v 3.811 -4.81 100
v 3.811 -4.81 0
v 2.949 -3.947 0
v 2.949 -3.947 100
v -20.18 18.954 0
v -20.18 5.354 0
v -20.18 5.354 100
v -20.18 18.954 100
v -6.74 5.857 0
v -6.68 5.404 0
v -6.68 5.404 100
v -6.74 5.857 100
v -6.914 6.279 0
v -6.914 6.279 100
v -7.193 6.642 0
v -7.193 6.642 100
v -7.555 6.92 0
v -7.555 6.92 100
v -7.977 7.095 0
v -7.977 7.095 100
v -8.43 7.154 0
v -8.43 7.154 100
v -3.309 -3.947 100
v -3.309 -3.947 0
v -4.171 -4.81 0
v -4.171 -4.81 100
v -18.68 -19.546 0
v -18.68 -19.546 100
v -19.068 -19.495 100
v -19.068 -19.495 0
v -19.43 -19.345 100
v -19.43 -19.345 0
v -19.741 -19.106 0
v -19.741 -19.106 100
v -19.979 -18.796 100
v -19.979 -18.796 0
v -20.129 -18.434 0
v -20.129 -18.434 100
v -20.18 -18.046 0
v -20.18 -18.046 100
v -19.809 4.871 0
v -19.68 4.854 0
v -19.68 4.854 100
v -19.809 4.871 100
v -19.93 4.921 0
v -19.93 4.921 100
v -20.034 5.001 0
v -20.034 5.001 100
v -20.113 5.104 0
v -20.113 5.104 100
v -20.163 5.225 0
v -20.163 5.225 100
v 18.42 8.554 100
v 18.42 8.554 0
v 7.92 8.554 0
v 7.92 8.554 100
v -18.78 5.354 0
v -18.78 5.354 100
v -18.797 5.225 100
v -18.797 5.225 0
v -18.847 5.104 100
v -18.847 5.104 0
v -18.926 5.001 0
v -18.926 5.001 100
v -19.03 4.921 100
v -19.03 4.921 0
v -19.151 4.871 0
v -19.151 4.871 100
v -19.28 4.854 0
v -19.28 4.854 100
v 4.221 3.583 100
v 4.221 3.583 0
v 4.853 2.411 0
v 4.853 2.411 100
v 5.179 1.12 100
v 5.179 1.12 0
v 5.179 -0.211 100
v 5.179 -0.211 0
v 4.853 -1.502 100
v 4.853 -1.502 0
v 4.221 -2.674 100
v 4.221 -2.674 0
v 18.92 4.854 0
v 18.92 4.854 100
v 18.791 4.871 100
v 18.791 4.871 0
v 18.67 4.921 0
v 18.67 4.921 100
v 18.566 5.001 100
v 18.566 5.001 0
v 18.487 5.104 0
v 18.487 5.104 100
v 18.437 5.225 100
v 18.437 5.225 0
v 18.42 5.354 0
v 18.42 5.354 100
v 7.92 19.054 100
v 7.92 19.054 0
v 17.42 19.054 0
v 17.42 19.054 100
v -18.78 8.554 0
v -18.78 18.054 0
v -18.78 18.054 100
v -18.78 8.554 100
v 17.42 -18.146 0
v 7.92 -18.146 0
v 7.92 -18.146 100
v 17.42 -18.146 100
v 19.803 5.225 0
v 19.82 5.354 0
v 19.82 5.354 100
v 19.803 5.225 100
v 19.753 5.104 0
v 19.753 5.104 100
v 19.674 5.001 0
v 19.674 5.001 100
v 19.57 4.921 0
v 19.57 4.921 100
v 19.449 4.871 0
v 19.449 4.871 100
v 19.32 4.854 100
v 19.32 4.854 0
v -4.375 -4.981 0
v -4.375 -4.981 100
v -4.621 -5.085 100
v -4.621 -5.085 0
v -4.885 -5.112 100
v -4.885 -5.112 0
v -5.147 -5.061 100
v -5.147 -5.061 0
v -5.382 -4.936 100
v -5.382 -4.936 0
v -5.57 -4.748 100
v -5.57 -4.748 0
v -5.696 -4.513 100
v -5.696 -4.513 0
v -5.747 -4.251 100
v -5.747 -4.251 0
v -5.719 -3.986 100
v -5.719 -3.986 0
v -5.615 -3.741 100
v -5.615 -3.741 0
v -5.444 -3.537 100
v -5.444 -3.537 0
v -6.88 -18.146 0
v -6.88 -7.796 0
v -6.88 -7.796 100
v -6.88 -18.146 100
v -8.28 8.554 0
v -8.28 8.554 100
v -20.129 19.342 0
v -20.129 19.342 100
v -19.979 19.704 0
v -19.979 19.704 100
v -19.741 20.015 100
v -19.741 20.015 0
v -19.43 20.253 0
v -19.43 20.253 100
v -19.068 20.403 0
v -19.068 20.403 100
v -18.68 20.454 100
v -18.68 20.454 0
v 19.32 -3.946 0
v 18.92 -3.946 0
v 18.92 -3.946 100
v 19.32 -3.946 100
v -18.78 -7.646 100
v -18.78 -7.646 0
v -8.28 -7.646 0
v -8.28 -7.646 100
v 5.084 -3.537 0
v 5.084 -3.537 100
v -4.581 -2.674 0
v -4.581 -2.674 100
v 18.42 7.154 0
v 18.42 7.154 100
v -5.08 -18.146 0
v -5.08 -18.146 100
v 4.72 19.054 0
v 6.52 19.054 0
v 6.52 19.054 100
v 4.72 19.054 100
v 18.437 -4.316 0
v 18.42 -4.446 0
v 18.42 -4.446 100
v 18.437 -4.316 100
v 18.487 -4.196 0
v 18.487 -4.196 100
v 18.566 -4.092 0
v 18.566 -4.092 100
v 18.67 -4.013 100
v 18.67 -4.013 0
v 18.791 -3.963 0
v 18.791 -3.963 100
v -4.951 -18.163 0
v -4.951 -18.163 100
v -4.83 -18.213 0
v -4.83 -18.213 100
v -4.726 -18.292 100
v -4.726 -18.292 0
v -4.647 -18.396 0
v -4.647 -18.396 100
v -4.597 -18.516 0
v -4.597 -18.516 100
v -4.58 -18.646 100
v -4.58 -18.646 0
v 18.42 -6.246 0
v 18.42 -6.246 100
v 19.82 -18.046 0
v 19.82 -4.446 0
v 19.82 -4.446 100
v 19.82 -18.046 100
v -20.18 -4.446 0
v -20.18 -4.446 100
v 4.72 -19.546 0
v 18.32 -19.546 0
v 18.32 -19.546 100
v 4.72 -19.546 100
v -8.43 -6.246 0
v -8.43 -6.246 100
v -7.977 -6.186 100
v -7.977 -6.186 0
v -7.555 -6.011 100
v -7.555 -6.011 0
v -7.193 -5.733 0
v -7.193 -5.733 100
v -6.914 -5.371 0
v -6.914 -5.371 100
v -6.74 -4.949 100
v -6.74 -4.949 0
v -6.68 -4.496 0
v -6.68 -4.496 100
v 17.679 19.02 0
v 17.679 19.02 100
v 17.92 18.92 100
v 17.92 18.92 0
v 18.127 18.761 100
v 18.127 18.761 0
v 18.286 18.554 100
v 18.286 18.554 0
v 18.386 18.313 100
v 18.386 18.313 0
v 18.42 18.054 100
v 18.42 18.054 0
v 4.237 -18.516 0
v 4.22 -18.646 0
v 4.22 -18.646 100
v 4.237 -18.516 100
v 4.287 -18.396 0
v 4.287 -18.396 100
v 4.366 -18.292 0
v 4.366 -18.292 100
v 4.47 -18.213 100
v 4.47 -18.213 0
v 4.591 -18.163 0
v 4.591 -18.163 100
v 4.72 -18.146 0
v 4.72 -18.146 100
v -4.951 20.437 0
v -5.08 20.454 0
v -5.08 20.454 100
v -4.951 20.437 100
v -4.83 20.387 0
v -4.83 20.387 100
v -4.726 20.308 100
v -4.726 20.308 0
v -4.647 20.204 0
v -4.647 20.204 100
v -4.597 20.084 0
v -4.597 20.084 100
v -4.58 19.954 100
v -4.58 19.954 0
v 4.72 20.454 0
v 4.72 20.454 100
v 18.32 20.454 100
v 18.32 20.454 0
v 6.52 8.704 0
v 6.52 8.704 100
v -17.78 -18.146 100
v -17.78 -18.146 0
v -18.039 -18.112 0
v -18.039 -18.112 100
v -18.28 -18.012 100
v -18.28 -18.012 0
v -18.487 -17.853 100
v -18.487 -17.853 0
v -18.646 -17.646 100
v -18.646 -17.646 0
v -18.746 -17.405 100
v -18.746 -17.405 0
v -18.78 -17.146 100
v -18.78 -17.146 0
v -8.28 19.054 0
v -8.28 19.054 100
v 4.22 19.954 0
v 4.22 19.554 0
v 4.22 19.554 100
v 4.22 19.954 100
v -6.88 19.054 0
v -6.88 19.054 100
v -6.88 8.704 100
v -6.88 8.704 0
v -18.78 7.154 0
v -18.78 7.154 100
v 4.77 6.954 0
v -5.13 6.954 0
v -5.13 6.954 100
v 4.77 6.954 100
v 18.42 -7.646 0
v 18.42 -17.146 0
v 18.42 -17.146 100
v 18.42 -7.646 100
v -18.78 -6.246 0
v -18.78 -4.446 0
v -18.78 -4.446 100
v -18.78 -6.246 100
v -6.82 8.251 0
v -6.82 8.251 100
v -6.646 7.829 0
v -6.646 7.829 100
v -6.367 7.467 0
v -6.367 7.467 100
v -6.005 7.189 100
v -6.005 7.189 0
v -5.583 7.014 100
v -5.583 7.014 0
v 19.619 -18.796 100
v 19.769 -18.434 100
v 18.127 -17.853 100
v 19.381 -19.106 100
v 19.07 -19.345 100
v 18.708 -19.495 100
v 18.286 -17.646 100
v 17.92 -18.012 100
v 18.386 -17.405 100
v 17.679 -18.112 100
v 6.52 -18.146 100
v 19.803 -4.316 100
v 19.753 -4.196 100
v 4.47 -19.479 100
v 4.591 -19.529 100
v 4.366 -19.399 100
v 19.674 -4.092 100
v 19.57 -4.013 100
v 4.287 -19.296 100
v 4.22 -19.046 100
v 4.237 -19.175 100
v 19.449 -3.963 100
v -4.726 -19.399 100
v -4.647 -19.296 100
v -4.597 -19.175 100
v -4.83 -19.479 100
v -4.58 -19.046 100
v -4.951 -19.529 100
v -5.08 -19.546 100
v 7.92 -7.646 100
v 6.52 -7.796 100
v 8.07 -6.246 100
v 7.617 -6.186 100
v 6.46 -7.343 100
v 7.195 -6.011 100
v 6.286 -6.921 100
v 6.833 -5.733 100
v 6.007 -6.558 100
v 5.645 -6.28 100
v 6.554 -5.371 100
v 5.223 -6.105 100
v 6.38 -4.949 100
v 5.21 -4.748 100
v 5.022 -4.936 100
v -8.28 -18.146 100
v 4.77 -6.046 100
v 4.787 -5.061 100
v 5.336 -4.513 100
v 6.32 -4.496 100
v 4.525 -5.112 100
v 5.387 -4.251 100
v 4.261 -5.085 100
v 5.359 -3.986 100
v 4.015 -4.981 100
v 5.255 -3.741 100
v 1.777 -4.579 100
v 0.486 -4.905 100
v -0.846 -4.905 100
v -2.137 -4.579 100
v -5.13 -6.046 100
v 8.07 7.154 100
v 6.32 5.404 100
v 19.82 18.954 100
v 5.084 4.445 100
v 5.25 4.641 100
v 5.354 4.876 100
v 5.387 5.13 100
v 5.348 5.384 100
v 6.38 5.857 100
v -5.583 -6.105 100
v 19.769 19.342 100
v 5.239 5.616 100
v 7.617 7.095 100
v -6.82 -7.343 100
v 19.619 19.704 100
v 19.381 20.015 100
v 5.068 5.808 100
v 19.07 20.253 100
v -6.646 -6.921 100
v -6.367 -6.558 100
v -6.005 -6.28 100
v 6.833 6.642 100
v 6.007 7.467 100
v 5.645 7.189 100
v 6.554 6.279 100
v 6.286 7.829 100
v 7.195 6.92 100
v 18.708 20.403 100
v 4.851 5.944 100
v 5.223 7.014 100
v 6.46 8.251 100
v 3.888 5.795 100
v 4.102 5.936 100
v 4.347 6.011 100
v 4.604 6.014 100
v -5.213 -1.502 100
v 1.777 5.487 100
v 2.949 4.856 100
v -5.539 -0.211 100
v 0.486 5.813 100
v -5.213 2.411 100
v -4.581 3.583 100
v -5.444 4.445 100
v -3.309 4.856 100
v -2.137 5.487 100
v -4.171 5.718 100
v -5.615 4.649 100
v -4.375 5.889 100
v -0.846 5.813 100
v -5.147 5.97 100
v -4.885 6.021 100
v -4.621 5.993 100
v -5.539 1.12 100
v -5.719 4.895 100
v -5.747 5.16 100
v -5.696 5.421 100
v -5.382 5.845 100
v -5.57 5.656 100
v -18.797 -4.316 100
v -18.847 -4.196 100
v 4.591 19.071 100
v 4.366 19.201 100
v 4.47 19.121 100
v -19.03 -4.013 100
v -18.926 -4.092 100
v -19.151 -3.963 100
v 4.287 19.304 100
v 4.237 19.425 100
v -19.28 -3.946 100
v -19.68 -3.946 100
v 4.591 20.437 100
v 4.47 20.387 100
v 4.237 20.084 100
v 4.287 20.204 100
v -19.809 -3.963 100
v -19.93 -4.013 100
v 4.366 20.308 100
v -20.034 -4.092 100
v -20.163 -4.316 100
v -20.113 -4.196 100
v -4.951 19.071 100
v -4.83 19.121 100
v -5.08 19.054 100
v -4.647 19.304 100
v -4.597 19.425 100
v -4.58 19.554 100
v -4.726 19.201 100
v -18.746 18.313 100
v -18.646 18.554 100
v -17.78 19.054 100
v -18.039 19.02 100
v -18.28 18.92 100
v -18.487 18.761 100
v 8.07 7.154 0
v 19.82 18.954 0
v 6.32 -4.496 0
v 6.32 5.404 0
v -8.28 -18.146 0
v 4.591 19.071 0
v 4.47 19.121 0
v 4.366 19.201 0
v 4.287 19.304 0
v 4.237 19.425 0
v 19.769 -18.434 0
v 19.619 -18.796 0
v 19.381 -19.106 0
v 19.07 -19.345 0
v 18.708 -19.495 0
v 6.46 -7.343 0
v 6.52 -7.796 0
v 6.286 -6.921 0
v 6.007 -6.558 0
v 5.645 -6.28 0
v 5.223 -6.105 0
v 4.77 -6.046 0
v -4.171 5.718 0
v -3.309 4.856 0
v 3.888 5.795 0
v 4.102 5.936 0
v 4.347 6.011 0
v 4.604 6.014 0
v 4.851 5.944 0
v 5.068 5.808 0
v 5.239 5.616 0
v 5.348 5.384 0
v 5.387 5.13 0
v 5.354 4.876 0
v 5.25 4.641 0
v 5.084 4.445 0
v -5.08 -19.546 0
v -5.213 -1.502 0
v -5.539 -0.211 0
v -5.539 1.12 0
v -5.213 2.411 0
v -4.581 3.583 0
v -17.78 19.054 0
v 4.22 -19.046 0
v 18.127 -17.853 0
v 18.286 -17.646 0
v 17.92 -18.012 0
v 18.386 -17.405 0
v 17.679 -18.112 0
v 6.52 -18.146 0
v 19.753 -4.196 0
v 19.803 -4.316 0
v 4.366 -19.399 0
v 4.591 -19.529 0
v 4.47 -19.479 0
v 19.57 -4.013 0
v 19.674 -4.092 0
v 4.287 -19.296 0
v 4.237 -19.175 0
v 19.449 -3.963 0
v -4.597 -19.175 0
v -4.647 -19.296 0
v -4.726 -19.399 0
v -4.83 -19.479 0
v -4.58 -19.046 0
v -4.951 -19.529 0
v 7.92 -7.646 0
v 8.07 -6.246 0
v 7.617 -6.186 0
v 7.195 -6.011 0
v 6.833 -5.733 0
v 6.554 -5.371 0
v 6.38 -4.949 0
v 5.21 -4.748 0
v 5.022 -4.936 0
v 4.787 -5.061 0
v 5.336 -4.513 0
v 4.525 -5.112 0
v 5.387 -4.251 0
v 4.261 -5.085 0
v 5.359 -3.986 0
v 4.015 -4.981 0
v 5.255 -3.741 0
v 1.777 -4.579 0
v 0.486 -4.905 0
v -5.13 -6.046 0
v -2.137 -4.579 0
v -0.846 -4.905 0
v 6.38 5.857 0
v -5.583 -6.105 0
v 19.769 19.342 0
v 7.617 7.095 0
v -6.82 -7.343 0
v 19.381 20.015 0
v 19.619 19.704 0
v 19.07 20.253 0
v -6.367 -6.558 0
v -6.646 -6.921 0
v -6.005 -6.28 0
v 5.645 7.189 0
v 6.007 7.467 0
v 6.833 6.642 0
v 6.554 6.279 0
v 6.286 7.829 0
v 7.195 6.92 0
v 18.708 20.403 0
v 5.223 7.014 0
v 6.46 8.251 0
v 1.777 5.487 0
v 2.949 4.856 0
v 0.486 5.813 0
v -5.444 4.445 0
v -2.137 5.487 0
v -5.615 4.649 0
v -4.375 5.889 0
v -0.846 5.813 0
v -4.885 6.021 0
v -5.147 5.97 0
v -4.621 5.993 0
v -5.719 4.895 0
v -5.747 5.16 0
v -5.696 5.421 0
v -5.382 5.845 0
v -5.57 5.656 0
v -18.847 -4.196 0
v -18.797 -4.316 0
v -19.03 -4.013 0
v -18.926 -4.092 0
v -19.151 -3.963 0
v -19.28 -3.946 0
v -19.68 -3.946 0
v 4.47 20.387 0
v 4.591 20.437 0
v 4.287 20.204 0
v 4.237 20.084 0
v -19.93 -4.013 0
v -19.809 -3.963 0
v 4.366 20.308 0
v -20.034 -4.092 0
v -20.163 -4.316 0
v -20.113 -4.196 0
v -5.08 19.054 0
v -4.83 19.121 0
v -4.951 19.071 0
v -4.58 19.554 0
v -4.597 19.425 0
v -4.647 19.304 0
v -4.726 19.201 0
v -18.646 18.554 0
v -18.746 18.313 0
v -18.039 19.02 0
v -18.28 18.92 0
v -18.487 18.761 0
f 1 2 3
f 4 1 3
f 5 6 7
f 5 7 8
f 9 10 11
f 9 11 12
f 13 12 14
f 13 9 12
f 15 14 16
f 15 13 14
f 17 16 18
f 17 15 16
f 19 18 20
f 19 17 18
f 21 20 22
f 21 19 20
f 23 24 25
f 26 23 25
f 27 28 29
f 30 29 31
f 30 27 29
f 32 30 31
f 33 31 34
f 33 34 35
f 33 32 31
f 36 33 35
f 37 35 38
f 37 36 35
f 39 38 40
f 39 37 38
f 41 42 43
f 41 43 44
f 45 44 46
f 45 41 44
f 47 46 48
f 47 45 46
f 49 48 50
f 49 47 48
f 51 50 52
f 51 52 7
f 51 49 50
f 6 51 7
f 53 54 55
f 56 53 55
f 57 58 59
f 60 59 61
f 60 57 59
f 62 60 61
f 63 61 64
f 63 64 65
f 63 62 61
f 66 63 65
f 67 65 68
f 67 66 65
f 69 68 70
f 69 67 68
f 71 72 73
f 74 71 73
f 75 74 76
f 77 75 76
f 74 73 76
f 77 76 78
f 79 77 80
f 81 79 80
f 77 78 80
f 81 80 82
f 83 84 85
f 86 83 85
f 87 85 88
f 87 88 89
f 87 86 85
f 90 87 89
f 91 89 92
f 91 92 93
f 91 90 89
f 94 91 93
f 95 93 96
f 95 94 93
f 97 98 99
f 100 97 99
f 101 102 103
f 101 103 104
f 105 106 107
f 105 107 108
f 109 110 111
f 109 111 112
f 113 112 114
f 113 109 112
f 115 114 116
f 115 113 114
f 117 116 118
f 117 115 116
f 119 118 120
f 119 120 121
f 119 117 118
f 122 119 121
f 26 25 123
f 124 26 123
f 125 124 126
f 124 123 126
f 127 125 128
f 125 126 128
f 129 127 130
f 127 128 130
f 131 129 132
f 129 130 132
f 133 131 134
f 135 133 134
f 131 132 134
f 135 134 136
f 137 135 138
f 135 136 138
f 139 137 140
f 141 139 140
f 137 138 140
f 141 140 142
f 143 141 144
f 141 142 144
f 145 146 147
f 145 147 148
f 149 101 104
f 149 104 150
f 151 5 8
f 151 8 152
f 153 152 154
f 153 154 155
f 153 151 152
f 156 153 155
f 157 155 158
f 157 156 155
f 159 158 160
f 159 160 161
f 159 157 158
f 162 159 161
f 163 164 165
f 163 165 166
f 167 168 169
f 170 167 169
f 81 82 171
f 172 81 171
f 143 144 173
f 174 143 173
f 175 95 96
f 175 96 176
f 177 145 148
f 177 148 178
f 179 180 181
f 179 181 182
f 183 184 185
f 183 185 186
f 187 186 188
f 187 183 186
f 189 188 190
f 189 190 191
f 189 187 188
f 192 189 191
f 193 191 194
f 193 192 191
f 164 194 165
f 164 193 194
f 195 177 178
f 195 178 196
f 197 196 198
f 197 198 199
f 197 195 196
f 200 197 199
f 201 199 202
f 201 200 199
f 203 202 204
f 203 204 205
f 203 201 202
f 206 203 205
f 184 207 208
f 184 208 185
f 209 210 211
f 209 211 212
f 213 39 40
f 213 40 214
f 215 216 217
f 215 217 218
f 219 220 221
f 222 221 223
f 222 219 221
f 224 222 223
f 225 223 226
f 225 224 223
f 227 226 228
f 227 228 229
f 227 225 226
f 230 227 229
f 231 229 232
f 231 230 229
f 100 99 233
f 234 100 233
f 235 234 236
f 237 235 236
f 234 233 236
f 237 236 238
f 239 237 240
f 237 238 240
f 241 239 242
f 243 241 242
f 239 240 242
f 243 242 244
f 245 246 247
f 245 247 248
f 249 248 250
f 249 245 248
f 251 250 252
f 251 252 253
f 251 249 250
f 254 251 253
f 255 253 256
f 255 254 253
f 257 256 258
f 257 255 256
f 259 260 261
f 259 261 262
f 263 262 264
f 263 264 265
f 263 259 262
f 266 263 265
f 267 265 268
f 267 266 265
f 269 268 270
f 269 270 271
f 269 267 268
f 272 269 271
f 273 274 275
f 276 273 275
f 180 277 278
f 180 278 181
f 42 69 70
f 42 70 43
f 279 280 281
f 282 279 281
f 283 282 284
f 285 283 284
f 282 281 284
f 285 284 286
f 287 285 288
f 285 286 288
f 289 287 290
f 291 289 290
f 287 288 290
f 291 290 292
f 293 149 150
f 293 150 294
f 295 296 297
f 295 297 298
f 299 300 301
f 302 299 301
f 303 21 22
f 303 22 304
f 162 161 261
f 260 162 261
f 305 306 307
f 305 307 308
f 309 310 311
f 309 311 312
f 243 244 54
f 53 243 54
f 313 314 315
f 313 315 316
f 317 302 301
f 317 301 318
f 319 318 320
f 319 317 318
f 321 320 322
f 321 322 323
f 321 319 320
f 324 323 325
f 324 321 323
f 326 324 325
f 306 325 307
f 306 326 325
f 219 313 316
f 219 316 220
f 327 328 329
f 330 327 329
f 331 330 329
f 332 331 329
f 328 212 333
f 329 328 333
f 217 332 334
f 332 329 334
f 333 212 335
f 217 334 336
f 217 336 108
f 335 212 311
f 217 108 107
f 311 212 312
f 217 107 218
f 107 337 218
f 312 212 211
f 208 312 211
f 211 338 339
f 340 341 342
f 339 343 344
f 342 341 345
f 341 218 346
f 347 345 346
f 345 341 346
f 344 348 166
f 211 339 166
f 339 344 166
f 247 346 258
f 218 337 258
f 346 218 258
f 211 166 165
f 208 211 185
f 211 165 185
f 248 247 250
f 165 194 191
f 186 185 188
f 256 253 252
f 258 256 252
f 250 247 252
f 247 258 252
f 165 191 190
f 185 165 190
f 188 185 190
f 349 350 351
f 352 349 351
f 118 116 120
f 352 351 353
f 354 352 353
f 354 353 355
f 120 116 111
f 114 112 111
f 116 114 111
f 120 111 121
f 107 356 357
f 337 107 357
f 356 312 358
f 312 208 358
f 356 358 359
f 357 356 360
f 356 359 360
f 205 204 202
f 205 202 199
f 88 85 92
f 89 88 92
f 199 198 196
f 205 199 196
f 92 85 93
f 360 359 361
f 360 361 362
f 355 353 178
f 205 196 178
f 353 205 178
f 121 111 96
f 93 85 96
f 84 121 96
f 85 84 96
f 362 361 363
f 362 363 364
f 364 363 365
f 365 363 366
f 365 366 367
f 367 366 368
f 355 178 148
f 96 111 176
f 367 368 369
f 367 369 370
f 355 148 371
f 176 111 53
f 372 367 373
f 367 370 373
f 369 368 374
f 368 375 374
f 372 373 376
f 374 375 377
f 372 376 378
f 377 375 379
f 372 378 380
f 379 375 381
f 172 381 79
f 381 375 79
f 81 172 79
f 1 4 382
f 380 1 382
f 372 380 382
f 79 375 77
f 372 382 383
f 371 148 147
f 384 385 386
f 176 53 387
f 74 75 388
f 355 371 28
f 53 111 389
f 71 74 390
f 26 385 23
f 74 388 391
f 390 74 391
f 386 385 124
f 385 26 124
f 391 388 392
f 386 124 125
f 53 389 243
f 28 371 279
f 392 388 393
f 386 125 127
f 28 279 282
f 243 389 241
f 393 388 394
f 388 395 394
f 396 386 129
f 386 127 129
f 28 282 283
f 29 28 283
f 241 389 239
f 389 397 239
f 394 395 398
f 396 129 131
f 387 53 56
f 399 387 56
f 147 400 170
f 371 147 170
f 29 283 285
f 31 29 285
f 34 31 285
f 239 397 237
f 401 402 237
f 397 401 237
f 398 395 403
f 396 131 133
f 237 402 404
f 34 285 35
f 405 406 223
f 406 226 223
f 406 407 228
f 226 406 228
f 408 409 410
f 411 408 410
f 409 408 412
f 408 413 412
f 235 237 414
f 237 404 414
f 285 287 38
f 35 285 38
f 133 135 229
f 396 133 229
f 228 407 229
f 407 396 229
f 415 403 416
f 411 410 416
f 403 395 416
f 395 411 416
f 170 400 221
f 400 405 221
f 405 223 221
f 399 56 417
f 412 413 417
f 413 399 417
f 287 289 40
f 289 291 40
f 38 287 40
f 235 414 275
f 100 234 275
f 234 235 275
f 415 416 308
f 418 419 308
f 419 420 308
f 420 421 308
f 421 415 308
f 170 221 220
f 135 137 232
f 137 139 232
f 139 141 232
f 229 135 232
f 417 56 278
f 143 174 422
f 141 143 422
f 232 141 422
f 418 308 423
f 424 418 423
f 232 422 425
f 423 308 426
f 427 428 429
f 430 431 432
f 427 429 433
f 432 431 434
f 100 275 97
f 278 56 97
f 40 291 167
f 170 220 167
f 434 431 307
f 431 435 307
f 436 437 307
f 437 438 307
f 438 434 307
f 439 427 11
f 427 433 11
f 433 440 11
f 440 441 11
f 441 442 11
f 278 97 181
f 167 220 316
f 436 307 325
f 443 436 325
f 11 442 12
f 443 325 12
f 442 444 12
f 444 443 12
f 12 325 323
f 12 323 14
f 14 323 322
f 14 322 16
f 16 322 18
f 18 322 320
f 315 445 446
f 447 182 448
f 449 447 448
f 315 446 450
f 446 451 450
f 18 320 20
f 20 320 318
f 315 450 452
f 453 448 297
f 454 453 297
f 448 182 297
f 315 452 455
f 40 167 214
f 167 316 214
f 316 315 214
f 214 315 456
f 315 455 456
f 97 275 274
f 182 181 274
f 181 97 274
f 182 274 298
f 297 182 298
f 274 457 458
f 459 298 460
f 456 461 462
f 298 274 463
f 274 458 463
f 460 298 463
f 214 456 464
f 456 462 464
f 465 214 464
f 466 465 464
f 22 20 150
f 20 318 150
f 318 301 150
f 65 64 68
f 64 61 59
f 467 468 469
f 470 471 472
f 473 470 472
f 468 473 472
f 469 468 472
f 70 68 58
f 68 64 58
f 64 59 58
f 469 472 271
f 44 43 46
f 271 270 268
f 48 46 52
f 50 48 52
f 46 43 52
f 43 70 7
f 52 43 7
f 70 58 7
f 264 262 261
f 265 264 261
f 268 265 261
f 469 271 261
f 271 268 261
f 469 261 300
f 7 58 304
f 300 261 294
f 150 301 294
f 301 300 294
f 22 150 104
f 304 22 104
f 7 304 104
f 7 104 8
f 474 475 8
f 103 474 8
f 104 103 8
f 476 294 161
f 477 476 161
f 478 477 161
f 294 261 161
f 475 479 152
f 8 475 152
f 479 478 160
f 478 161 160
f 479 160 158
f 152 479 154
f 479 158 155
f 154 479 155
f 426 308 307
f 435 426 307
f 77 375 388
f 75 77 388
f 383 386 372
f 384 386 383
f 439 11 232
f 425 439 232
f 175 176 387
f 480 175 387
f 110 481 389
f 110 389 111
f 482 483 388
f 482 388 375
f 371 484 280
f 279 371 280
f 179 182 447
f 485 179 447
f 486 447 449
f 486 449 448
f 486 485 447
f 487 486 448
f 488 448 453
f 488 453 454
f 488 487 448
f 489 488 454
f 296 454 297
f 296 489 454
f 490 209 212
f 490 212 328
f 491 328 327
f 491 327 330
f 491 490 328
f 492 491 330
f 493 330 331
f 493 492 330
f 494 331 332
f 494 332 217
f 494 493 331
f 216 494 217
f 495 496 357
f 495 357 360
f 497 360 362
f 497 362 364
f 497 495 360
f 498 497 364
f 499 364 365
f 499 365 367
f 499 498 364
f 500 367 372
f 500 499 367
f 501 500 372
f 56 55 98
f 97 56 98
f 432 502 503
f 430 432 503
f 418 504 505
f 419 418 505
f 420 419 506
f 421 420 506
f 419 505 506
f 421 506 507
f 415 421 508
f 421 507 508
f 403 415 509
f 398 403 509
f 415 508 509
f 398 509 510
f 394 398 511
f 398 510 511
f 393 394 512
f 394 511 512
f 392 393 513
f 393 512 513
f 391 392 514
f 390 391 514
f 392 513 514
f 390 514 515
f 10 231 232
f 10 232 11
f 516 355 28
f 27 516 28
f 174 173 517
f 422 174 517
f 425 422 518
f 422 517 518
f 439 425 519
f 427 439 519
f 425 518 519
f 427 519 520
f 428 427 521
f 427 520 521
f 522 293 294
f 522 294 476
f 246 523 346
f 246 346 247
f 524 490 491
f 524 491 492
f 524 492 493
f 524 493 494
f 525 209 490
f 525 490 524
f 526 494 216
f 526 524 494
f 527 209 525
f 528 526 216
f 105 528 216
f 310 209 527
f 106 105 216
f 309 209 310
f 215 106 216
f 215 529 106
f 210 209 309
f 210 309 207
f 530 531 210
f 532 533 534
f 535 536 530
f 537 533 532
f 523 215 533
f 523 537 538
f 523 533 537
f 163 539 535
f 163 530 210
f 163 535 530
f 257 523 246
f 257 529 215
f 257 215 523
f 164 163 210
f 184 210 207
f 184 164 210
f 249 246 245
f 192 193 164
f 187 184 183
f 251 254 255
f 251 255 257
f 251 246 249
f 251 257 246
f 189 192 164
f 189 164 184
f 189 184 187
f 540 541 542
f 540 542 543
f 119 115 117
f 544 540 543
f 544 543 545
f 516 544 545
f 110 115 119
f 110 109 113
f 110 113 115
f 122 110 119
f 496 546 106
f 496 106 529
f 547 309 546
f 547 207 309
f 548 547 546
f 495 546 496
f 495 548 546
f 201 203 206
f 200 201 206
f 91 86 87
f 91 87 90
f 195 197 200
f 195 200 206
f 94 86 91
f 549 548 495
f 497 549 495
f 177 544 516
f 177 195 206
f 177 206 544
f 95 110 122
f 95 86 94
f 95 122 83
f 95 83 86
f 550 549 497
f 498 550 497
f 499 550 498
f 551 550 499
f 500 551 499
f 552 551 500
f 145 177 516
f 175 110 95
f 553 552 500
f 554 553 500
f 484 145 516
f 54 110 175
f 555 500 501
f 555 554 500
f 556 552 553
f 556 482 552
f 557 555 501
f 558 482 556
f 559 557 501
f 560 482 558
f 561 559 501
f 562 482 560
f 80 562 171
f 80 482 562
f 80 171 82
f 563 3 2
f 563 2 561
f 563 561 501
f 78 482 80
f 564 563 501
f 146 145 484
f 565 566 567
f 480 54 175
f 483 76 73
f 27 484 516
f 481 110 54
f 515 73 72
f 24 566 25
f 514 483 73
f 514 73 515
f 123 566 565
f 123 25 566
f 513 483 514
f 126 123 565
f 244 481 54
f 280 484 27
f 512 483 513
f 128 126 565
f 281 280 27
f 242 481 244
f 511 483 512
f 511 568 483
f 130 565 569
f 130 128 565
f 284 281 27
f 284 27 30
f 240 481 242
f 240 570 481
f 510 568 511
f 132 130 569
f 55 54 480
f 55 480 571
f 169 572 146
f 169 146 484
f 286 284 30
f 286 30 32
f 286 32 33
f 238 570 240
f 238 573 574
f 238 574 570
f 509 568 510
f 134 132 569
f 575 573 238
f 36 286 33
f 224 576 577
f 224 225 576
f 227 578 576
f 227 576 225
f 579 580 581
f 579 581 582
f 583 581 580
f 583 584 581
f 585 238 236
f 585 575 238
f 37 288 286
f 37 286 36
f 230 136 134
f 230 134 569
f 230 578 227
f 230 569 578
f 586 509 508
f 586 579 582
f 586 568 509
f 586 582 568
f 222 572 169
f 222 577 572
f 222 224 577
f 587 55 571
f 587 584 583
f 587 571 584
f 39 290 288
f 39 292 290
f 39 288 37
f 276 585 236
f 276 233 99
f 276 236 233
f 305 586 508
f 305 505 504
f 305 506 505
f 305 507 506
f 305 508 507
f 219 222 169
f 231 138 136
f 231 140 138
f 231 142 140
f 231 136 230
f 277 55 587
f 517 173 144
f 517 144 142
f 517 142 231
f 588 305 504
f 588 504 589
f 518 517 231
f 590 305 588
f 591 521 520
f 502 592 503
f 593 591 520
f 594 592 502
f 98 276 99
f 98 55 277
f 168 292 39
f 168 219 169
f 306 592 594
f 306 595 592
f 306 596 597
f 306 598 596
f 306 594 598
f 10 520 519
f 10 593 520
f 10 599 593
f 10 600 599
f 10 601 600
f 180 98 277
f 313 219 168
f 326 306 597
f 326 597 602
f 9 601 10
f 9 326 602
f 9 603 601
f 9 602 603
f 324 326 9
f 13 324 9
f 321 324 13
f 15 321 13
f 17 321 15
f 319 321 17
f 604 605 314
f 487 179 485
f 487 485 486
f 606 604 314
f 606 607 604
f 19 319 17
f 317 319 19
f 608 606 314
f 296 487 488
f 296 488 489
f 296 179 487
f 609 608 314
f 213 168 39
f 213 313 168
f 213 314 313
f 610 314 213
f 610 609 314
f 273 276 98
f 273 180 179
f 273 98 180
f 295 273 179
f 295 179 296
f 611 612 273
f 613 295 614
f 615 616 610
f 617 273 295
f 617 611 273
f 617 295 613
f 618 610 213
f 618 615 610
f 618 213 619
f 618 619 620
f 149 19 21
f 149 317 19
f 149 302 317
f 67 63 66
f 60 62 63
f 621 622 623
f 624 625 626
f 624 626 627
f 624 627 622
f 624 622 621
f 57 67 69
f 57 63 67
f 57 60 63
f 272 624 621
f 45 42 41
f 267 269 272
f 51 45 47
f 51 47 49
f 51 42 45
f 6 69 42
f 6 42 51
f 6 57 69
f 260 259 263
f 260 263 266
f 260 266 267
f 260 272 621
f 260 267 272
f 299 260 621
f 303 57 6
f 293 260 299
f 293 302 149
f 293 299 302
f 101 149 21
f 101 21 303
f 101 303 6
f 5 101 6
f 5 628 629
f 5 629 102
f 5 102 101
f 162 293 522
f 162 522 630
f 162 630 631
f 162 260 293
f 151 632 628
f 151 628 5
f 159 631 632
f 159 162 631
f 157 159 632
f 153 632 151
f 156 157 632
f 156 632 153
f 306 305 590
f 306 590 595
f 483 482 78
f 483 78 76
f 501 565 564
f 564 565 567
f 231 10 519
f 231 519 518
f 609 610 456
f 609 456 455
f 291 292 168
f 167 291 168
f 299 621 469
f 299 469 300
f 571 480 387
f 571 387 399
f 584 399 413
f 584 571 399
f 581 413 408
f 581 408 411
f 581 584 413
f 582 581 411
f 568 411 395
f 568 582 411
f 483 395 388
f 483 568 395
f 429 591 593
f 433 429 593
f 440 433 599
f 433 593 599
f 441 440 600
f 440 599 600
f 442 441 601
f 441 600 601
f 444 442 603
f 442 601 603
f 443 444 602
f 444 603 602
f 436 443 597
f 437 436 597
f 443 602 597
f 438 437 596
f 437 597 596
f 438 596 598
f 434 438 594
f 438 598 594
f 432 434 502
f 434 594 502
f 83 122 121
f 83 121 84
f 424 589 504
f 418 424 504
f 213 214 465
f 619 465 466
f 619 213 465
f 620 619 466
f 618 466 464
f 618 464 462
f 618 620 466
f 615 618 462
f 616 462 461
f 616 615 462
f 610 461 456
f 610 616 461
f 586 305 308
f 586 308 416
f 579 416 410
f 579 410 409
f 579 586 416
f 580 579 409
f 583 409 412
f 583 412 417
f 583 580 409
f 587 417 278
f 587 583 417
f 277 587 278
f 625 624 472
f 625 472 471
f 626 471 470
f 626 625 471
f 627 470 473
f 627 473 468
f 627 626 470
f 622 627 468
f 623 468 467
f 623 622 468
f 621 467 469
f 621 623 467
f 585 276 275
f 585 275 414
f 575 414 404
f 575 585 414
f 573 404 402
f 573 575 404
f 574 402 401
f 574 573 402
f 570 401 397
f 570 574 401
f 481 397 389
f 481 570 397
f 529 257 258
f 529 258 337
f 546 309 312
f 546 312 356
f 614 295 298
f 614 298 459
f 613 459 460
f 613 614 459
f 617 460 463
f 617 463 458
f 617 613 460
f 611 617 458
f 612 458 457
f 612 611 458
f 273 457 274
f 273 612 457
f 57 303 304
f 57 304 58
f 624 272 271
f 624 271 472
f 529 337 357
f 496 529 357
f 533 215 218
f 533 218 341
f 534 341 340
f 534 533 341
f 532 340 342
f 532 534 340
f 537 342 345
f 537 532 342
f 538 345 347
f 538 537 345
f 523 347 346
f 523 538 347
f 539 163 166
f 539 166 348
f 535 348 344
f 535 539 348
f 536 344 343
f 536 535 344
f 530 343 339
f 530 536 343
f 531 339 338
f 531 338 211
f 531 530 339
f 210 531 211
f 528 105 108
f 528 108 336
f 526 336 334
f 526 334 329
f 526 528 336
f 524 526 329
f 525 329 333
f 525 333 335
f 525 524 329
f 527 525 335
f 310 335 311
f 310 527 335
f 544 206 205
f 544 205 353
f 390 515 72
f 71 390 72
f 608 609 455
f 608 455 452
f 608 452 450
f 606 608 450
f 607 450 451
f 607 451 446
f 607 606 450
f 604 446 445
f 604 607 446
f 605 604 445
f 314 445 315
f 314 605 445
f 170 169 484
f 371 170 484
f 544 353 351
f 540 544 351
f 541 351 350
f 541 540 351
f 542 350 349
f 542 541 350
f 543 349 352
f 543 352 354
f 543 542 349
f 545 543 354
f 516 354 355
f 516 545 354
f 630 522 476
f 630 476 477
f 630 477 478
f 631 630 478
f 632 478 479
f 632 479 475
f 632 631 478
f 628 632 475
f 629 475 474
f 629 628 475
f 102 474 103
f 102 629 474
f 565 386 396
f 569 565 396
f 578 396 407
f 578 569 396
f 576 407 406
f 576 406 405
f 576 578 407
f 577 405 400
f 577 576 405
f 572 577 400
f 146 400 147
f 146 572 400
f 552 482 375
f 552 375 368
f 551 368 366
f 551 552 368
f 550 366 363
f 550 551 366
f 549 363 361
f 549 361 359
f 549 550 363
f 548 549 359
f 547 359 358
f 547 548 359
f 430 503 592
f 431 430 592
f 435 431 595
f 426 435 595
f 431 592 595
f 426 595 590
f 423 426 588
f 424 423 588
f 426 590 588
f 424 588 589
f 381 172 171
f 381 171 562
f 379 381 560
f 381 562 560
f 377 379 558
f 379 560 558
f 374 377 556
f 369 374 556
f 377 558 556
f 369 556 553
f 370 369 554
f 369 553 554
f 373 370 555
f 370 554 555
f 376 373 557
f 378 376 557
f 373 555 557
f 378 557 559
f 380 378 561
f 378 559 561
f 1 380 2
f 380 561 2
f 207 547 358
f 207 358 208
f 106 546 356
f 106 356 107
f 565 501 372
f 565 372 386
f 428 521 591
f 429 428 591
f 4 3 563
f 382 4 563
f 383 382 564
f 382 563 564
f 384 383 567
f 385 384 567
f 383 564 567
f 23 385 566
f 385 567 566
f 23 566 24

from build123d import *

# Parameters (mm, degrees)
EXTRUDE_1_DEPTH = 100


with BuildPart() as part:
    # 草图1 → 凸台-拉伸1 (new body)
    with BuildSketch(Plane.XY):
        with BuildLine():
            Line((-18.780003001, 7.154207574), (-18.780003001, 5.354207574))
            ThreePointArc((-18.780003001, 5.354207574), (-18.926449611, 5.000654183), (-19.280003001, 4.854207574))
            Line((-19.280003001, 4.854207574), (-19.680003001, 4.854207574))
            ThreePointArc((-19.680003001, 4.854207574), (-20.033556392, 5.000654183), (-20.180003001, 5.354207574))
            Line((-20.180003001, 5.354207574), (-20.180003001, 18.954207574))
            ThreePointArc((-20.180003001, 18.954207574), (-19.740663173, 20.014867745), (-18.680003001, 20.454207574))
            Line((-18.680003001, 20.454207574), (-5.080003001, 20.454207574))
            ThreePointArc((-5.080003001, 20.454207574), (-4.726449611, 20.307760964), (-4.580003001, 19.954207574))
            Line((-4.580003001, 19.954207574), (-4.580003001, 19.554207574))
            ThreePointArc((-4.580003001, 19.554207574), (-4.726449611, 19.200654183), (-5.080003001, 19.054207574))
            Line((-5.080003001, 19.054207574), (-6.880003001, 19.054207574))
            Line((-6.880003001, 19.054207574), (-6.880003001, 8.704207574))
            ThreePointArc((-6.880003001, 8.704207574), (-6.367439869, 7.466770707), (-5.130003001, 6.954207574))
            Line((-5.130003001, 6.954207574), (4.769996999, 6.954207574))
            ThreePointArc((4.769996999, 6.954207574), (6.007433866, 7.466770707), (6.519996999, 8.704207574))
            Line((6.519996999, 8.704207574), (6.519996999, 19.054207574))
            Line((6.519996999, 19.054207574), (4.719996999, 19.054207574))
            ThreePointArc((4.719996999, 19.054207574), (4.366443608, 19.200654183), (4.219996999, 19.554207574))
            Line((4.219996999, 19.554207574), (4.219996999, 19.954207574))
            ThreePointArc((4.219996999, 19.954207574), (4.366443608, 20.307760964), (4.719996999, 20.454207574))
            Line((4.719996999, 20.454207574), (18.319996999, 20.454207574))
            ThreePointArc((18.319996999, 20.454207574), (19.38065717, 20.014867745), (19.819996999, 18.954207574))
            Line((19.819996999, 18.954207574), (19.819996999, 5.354207574))
            ThreePointArc((19.819996999, 5.354207574), (19.673550389, 5.000654183), (19.319996999, 4.854207574))
            Line((19.319996999, 4.854207574), (18.919996999, 4.854207574))
            ThreePointArc((18.919996999, 4.854207574), (18.566443608, 5.000654183), (18.419996999, 5.354207574))
            Line((18.419996999, 5.354207574), (18.419996999, 7.154207574))
            Line((18.419996999, 7.154207574), (8.069996999, 7.154207574))
            ThreePointArc((8.069996999, 7.154207574), (6.832560131, 6.641644441), (6.319996999, 5.404207574))
            Line((6.319996999, 5.404207574), (6.319996999, -4.495792426))
            ThreePointArc((6.319996999, -4.495792426), (6.832560131, -5.733229293), (8.069996999, -6.245792426))
            Line((8.069996999, -6.245792426), (18.419996999, -6.245792426))
            Line((18.419996999, -6.245792426), (18.419996999, -4.445792426))
            ThreePointArc((18.419996999, -4.445792426), (18.566443608, -4.092239036), (18.919996999, -3.945792426))
            Line((18.919996999, -3.945792426), (19.319996999, -3.945792426))
            ThreePointArc((19.319996999, -3.945792426), (19.673550389, -4.092239036), (19.819996999, -4.445792426))
            Line((19.819996999, -4.445792426), (19.819996999, -18.045792426))
            ThreePointArc((19.819996999, -18.045792426), (19.38065717, -19.106452598), (18.319996999, -19.545792426))
            Line((18.319996999, -19.545792426), (4.719996999, -19.545792426))
            ThreePointArc((4.719996999, -19.545792426), (4.366443608, -19.399345817), (4.219996999, -19.045792426))
            Line((4.219996999, -19.045792426), (4.219996999, -18.645792426))
            ThreePointArc((4.219996999, -18.645792426), (4.366443608, -18.292239036), (4.719996999, -18.145792426))
            Line((4.719996999, -18.145792426), (6.519996999, -18.145792426))
            Line((6.519996999, -18.145792426), (6.519996999, -7.795792426))
            ThreePointArc((6.519996999, -7.795792426), (6.007433866, -6.558355559), (4.769996999, -6.045792426))
            Line((4.769996999, -6.045792426), (-5.130003001, -6.045792426))
            ThreePointArc((-5.130003001, -6.045792426), (-6.367439869, -6.558355559), (-6.880003001, -7.795792426))
            Line((-6.880003001, -7.795792426), (-6.880003001, -18.145792426))
            Line((-6.880003001, -18.145792426), (-5.080003001, -18.145792426))
            ThreePointArc((-5.080003001, -18.145792426), (-4.726449611, -18.292239036), (-4.580003001, -18.645792426))
            Line((-4.580003001, -18.645792426), (-4.580003001, -19.045792426))
            ThreePointArc((-4.580003001, -19.045792426), (-4.726449611, -19.399345817), (-5.080003001, -19.545792426))
            Line((-5.080003001, -19.545792426), (-18.680003001, -19.545792426))
            ThreePointArc((-18.680003001, -19.545792426), (-19.740663173, -19.106452598), (-20.180003001, -18.045792426))
            Line((-20.180003001, -18.045792426), (-20.180003001, -4.445792426))
            ThreePointArc((-20.180003001, -4.445792426), (-20.033556392, -4.092239036), (-19.680003001, -3.945792426))
            Line((-19.680003001, -3.945792426), (-19.280003001, -3.945792426))
            ThreePointArc((-19.280003001, -3.945792426), (-18.926449611, -4.092239036), (-18.780003001, -4.445792426))
            Line((-18.780003001, -4.445792426), (-18.780003001, -6.245792426))
            Line((-18.780003001, -6.245792426), (-8.430003001, -6.245792426))
            ThreePointArc((-8.430003001, -6.245792426), (-7.192566134, -5.733229293), (-6.680003001, -4.495792426))
            Line((-6.680003001, -4.495792426), (-6.680003001, 5.404207574))
            ThreePointArc((-6.680003001, 5.404207574), (-7.192566134, 6.641644441), (-8.430003001, 7.154207574))
            Line((-8.430003001, 7.154207574), (-18.780003001, 7.154207574))
        make_face()
        with BuildLine():
            Line((-8.280003001, 19.054207574), (-17.780003001, 19.054207574))
            ThreePointArc((-17.780003001, 19.054207574), (-18.487109783, 18.761314355), (-18.780003001, 18.054207574))
            Line((-18.780003001, 18.054207574), (-18.780003001, 8.554207574))
            Line((-18.780003001, 8.554207574), (-8.280003001, 8.554207574))
            Line((-8.280003001, 8.554207574), (-8.280003001, 19.054207574))
        make_face(mode=Mode.SUBTRACT)
        with BuildLine():
            Line((-4.581369224, 3.58278159), (-5.443828842, 4.445241208))
            ThreePointArc((-5.443828842, 4.445241208), (-5.48330386, 5.757508433), (-4.171036636, 5.718033415))
            Line((-4.171036636, 5.718033415), (-3.308577018, 4.855573796))
            ThreePointArc((-3.308577018, 4.855573796), (-0.180003001, 5.854207574), (2.948571015, 4.855573796))
            Line((2.948571015, 4.855573796), (3.887675086, 5.794677867))
            ThreePointArc((3.887675086, 5.794677867), (5.160467292, 5.718033415), (5.083822839, 4.445241208))
            Line((5.083822839, 4.445241208), (4.221363221, 3.58278159))
            ThreePointArc((4.221363221, 3.58278159), (5.219996999, 0.454207574), (4.221363221, -2.674366443))
            Line((4.221363221, -2.674366443), (5.083822839, -3.536826061))
            ThreePointArc((5.083822839, -3.536826061), (5.123297857, -4.849093285), (3.811030633, -4.809618267))
            Line((3.811030633, -4.809618267), (2.948571015, -3.947158649))
            ThreePointArc((2.948571015, -3.947158649), (-0.180003001, -4.945792426), (-3.308577018, -3.947158649))
            Line((-3.308577018, -3.947158649), (-4.171036636, -4.809618267))
            ThreePointArc((-4.171036636, -4.809618267), (-5.48330386, -4.849093285), (-5.443828842, -3.536826061))
            Line((-5.443828842, -3.536826061), (-4.581369224, -2.674366443))
            ThreePointArc((-4.581369224, -2.674366443), (-5.580003001, 0.454207574), (-4.581369224, 3.58278159))
        make_face(mode=Mode.SUBTRACT)
        with BuildLine():
            Line((7.919996999, 19.054207574), (17.419996999, 19.054207574))
            ThreePointArc((17.419996999, 19.054207574), (18.12710378, 18.761314355), (18.419996999, 18.054207574))
            Line((18.419996999, 18.054207574), (18.419996999, 8.554207574))
            Line((18.419996999, 8.554207574), (7.919996999, 8.554207574))
            Line((7.919996999, 8.554207574), (7.919996999, 19.054207574))
        make_face(mode=Mode.SUBTRACT)
        with BuildLine():
            Line((-8.280003001, -18.145792426), (-17.780003001, -18.145792426))
            ThreePointArc((-17.780003001, -18.145792426), (-18.487109783, -17.852899208), (-18.780003001, -17.145792426))
            Line((-18.780003001, -17.145792426), (-18.780003001, -7.645792426))
            Line((-18.780003001, -7.645792426), (-8.280003001, -7.645792426))
            Line((-8.280003001, -7.645792426), (-8.280003001, -18.145792426))
        make_face(mode=Mode.SUBTRACT)
        with BuildLine():
            Line((7.919996999, -18.145792426), (17.419996999, -18.145792426))
            ThreePointArc((17.419996999, -18.145792426), (18.12710378, -17.852899208), (18.419996999, -17.145792426))
            Line((18.419996999, -17.145792426), (18.419996999, -7.645792426))
            Line((18.419996999, -7.645792426), (7.919996999, -7.645792426))
            Line((7.919996999, -7.645792426), (7.919996999, -18.145792426))
        make_face(mode=Mode.SUBTRACT)
    extrude(amount=EXTRUDE_1_DEPTH)


solid = part.part
